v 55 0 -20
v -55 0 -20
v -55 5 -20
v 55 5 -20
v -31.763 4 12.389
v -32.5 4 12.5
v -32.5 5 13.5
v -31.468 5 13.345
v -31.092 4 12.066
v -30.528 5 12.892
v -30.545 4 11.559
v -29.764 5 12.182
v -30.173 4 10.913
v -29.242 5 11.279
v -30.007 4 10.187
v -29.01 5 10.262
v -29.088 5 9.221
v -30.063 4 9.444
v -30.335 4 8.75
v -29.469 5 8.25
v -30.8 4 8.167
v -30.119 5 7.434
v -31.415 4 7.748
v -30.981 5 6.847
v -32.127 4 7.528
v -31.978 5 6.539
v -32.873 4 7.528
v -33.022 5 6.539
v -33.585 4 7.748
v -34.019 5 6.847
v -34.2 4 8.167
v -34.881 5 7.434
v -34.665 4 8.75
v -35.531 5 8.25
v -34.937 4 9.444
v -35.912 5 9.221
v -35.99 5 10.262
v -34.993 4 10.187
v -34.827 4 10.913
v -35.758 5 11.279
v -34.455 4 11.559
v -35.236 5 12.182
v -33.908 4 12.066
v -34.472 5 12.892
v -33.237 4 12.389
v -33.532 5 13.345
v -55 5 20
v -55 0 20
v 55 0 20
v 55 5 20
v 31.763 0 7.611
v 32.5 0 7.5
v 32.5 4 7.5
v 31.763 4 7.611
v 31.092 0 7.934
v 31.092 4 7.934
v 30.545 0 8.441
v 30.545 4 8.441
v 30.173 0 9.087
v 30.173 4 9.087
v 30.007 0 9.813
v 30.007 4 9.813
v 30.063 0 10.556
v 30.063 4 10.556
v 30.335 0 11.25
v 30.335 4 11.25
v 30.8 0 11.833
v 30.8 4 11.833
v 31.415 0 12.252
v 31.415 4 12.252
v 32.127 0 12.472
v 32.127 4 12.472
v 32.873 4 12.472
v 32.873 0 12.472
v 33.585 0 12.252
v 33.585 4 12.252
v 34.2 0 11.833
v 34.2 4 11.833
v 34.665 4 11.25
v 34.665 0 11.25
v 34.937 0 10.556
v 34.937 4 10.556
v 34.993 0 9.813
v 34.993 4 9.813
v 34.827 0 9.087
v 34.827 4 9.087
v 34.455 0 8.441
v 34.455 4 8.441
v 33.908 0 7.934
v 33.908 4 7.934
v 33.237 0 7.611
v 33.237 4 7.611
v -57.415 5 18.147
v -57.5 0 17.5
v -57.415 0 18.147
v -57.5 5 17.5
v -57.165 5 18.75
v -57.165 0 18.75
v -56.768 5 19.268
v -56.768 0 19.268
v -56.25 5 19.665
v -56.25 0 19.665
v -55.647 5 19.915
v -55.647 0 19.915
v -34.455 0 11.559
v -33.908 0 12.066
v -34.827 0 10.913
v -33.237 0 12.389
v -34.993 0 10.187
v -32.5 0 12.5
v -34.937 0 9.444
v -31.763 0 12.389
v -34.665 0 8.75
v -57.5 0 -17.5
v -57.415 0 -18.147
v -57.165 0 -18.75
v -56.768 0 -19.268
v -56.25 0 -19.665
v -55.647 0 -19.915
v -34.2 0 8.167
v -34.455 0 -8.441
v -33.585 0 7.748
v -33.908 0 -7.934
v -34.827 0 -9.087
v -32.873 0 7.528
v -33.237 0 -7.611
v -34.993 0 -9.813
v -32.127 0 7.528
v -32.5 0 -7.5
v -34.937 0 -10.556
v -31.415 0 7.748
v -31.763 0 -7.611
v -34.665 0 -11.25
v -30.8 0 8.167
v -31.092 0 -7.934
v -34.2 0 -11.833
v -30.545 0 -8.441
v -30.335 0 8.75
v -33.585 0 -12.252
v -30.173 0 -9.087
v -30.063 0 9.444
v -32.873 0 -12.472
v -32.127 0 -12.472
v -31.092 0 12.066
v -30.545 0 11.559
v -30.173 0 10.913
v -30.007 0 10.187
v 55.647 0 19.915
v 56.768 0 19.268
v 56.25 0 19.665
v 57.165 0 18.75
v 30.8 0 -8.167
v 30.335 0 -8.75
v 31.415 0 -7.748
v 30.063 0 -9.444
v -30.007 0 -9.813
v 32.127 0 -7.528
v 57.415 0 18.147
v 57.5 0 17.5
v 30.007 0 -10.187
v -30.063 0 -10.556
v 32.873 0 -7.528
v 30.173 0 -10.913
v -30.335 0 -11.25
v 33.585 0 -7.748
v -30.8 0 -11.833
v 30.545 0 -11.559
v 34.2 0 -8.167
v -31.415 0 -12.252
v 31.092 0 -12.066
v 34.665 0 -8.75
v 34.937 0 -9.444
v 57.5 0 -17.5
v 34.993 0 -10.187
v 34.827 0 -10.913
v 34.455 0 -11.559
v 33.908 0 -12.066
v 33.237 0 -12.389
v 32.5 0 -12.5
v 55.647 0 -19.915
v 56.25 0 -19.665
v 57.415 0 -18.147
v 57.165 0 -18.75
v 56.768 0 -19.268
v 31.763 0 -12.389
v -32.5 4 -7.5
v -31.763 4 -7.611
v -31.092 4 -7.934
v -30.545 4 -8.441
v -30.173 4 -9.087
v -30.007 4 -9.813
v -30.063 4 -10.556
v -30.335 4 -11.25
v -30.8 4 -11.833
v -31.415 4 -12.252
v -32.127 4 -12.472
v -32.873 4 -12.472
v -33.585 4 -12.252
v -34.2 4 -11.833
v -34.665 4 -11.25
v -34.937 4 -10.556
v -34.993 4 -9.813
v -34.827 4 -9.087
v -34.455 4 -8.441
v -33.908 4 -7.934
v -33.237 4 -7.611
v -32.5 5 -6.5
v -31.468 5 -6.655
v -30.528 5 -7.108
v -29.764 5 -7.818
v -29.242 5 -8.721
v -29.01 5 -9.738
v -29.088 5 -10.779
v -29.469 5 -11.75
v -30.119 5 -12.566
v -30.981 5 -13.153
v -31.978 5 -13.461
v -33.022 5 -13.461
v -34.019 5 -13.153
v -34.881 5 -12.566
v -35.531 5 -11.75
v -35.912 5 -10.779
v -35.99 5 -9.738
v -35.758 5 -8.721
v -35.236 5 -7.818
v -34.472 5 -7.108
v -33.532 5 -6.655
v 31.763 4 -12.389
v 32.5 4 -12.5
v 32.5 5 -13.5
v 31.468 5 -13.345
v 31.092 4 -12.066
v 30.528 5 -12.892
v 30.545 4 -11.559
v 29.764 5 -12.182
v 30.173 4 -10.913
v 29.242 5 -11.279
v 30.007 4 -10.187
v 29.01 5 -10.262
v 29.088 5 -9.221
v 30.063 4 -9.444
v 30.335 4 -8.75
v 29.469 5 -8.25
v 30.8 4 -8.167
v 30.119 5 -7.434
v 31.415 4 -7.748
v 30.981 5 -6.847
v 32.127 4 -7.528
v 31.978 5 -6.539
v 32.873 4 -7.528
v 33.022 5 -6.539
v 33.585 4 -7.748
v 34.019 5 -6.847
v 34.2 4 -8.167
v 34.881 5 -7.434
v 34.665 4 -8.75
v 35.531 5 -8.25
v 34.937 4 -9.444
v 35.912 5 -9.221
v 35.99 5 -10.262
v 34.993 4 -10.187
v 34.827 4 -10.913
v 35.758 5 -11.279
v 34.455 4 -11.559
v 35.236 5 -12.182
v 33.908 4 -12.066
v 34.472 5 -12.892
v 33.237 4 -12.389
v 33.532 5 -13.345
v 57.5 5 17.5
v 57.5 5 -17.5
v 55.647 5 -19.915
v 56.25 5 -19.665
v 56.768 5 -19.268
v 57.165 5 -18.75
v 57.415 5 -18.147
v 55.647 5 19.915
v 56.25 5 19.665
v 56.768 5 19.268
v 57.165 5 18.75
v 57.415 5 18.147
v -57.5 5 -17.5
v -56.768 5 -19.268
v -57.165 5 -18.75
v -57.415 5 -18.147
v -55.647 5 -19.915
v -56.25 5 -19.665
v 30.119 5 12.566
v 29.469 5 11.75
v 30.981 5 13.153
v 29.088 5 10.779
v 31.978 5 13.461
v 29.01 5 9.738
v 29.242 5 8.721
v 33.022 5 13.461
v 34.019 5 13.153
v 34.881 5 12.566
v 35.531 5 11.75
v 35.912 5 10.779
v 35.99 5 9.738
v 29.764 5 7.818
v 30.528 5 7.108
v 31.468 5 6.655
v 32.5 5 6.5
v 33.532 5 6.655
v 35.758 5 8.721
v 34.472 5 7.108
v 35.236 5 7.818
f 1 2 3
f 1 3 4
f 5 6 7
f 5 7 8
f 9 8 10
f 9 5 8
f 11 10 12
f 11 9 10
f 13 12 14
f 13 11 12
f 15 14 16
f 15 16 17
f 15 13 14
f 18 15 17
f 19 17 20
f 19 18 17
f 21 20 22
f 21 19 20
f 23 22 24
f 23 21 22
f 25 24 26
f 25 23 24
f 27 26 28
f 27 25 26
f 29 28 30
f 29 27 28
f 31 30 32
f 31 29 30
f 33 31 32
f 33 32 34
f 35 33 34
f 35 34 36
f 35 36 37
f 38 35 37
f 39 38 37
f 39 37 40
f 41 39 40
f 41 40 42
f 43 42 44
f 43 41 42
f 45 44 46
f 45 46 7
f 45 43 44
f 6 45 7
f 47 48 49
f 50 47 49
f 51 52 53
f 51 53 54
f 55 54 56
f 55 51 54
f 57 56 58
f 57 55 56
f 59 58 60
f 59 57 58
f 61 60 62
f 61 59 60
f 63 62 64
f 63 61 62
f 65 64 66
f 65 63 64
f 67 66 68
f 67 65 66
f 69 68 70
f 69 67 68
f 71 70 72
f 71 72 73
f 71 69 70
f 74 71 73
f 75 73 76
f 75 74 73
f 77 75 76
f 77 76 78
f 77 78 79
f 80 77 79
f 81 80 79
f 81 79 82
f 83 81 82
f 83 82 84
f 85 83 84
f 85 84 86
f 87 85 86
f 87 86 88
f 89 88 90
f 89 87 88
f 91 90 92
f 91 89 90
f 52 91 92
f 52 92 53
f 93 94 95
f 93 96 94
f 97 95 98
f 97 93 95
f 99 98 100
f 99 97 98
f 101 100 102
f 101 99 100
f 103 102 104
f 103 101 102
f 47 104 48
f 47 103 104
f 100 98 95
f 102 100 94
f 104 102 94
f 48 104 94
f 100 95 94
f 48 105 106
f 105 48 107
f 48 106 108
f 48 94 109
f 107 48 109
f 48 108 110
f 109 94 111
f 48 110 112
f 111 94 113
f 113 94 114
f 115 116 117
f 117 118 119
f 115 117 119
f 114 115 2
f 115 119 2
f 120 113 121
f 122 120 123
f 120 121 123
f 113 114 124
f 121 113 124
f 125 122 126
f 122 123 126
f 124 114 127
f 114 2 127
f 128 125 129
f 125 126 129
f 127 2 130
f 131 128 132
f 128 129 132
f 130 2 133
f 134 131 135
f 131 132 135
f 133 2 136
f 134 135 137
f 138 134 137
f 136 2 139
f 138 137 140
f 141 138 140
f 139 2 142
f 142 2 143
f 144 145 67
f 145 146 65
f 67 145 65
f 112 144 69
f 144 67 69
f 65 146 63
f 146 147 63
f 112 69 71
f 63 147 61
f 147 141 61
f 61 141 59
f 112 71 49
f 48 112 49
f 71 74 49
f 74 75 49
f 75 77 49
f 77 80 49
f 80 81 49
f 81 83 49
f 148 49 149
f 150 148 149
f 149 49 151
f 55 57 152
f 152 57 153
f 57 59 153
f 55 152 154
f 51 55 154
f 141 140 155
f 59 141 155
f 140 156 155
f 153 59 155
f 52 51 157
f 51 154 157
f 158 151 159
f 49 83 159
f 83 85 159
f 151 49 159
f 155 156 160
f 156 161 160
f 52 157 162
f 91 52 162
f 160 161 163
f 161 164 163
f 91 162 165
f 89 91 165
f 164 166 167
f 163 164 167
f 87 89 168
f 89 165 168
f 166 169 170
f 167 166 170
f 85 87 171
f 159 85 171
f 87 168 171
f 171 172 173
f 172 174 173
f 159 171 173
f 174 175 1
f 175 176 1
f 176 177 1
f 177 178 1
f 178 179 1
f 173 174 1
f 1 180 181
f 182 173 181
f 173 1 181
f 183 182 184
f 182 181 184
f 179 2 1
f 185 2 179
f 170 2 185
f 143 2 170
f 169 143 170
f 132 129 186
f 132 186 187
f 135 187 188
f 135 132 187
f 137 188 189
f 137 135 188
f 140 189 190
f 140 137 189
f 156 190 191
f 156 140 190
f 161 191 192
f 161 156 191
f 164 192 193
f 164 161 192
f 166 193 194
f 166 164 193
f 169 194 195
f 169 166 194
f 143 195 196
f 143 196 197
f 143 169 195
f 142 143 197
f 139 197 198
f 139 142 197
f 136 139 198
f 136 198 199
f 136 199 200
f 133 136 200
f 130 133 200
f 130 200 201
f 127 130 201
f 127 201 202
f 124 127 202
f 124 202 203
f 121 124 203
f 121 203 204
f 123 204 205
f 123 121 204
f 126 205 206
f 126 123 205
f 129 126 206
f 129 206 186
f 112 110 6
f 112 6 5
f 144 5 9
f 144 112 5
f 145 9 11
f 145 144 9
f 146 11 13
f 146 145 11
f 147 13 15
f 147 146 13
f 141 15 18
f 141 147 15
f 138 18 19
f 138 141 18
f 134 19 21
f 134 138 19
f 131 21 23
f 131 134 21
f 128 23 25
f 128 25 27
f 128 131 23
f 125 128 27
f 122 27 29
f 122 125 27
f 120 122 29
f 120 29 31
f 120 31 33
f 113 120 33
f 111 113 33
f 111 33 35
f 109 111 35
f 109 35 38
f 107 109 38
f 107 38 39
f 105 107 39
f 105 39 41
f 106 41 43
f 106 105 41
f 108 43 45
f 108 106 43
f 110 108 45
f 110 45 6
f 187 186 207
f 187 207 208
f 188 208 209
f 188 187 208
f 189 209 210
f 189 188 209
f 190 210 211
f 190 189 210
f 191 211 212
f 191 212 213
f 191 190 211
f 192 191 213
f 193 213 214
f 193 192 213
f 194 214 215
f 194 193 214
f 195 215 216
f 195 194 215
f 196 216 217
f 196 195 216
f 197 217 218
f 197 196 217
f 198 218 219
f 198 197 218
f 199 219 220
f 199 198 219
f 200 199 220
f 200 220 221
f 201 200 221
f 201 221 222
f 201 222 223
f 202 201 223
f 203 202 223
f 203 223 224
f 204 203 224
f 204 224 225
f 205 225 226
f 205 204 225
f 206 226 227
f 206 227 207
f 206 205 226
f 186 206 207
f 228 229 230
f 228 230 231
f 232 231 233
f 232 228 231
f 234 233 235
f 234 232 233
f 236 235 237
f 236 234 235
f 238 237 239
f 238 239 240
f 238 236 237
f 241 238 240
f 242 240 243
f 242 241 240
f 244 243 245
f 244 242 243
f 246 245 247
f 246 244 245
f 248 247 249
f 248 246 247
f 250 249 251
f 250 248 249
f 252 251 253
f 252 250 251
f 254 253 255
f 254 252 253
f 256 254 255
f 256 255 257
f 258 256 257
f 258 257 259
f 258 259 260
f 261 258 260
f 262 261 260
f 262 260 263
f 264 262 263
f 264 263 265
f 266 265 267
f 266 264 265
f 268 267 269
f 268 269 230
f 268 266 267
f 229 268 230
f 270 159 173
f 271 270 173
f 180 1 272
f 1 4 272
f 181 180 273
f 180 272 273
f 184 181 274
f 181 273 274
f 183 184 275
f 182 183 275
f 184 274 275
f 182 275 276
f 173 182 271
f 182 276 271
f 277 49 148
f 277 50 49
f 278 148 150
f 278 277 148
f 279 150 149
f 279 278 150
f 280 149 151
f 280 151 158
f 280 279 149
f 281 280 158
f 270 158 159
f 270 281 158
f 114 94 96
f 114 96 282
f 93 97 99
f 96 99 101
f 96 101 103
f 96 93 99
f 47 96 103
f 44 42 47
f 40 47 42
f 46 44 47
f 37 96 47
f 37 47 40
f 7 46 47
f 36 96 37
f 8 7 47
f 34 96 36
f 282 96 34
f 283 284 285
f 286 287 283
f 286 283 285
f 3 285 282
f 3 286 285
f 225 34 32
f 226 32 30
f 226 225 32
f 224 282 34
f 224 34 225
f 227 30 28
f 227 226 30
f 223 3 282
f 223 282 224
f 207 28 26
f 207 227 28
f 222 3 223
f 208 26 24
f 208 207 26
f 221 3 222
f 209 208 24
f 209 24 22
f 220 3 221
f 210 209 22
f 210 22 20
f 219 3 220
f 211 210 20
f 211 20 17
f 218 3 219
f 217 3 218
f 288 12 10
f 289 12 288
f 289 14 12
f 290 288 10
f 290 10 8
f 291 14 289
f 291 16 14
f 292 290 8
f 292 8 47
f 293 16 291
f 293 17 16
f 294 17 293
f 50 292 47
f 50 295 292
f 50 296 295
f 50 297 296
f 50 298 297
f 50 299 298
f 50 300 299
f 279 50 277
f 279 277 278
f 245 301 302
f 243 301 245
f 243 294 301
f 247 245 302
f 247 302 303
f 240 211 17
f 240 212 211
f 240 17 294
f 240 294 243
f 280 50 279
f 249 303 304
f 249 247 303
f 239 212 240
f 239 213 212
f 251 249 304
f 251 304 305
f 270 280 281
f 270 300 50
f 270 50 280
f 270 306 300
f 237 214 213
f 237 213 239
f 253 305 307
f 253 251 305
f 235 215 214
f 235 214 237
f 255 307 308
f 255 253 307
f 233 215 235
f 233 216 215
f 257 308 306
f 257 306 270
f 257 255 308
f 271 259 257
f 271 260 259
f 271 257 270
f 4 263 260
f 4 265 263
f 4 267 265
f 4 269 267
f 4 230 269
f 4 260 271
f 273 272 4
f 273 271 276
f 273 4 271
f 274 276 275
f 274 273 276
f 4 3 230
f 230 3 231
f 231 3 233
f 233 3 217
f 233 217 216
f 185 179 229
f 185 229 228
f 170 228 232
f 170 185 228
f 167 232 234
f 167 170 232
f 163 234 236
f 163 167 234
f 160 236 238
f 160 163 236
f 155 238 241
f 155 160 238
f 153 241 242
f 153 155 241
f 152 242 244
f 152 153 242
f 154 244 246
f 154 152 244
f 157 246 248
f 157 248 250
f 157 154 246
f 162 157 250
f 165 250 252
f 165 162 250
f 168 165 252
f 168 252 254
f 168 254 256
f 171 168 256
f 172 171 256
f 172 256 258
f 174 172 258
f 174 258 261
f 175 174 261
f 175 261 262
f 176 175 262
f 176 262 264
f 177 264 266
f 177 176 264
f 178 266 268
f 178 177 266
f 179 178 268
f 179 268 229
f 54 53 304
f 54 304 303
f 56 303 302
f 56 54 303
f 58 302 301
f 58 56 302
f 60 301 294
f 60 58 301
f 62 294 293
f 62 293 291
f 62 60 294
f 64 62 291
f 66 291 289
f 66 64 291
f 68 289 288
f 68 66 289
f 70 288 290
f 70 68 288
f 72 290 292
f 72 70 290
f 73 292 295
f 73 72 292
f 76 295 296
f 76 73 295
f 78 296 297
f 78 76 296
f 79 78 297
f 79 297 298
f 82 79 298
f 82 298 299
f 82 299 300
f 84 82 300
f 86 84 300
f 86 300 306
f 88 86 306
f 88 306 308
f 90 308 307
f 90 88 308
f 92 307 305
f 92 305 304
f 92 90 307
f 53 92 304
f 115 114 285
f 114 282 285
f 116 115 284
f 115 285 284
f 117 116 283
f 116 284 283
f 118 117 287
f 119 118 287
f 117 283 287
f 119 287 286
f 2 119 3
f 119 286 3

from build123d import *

# Parameters (mm, degrees)
SKETCH1_W           = 115
SKETCH1_H           = 40
SKETCH1_R           = 2.5
BOSS_EXTRUDE1_DEPTH = 5
FILLET1_R           = 2.5
CHAMFER1_SIZE       = 1


with BuildPart() as part:
    # Sketch1 → Boss-Extrude1 (new body)
    with BuildSketch(Plane(origin=(0, 0, 0), x_dir=(1, 0, 0), z_dir=(0, 1, 0))):
        Rectangle(SKETCH1_W, SKETCH1_H)
        with Locations(Location((-32.5, 10, 0), (0, 0, 270))):
            Circle(SKETCH1_R, mode=Mode.SUBTRACT)
        with Locations(Location((-32.5, -10, 0), (0, 0, 270))):
            Circle(SKETCH1_R, mode=Mode.SUBTRACT)
        with Locations(Location((32.5, -10, 0), (0, 0, 90))):
            Circle(SKETCH1_R, mode=Mode.SUBTRACT)
        with Locations(Location((32.5, 10, 0), (0, 0, 90))):
            Circle(SKETCH1_R, mode=Mode.SUBTRACT)
    extrude(amount=BOSS_EXTRUDE1_DEPTH)

    # Fillet1
    fillet1_edges = [part.edges().sort_by_distance(p)[0] for p in [
        (57.5, 2.5, 20),
        (-57.5, 2.5, 20),
        (-57.5, 2.5, -20),
        (57.5, 2.5, -20),
    ]]
    fillet(fillet1_edges, radius=FILLET1_R)

    # Chamfer1
    chamfer1_edges = [part.edges().sort_by_distance(p)[0] for p in [
        (-32.5, 5, -12.5),
        (-32.5, 5, 7.5),
        (32.5, 5, 12.5),
        (32.5, 5, -7.5),
    ]]
    chamfer(chamfer1_edges, length=CHAMFER1_SIZE)


solid = part.part
